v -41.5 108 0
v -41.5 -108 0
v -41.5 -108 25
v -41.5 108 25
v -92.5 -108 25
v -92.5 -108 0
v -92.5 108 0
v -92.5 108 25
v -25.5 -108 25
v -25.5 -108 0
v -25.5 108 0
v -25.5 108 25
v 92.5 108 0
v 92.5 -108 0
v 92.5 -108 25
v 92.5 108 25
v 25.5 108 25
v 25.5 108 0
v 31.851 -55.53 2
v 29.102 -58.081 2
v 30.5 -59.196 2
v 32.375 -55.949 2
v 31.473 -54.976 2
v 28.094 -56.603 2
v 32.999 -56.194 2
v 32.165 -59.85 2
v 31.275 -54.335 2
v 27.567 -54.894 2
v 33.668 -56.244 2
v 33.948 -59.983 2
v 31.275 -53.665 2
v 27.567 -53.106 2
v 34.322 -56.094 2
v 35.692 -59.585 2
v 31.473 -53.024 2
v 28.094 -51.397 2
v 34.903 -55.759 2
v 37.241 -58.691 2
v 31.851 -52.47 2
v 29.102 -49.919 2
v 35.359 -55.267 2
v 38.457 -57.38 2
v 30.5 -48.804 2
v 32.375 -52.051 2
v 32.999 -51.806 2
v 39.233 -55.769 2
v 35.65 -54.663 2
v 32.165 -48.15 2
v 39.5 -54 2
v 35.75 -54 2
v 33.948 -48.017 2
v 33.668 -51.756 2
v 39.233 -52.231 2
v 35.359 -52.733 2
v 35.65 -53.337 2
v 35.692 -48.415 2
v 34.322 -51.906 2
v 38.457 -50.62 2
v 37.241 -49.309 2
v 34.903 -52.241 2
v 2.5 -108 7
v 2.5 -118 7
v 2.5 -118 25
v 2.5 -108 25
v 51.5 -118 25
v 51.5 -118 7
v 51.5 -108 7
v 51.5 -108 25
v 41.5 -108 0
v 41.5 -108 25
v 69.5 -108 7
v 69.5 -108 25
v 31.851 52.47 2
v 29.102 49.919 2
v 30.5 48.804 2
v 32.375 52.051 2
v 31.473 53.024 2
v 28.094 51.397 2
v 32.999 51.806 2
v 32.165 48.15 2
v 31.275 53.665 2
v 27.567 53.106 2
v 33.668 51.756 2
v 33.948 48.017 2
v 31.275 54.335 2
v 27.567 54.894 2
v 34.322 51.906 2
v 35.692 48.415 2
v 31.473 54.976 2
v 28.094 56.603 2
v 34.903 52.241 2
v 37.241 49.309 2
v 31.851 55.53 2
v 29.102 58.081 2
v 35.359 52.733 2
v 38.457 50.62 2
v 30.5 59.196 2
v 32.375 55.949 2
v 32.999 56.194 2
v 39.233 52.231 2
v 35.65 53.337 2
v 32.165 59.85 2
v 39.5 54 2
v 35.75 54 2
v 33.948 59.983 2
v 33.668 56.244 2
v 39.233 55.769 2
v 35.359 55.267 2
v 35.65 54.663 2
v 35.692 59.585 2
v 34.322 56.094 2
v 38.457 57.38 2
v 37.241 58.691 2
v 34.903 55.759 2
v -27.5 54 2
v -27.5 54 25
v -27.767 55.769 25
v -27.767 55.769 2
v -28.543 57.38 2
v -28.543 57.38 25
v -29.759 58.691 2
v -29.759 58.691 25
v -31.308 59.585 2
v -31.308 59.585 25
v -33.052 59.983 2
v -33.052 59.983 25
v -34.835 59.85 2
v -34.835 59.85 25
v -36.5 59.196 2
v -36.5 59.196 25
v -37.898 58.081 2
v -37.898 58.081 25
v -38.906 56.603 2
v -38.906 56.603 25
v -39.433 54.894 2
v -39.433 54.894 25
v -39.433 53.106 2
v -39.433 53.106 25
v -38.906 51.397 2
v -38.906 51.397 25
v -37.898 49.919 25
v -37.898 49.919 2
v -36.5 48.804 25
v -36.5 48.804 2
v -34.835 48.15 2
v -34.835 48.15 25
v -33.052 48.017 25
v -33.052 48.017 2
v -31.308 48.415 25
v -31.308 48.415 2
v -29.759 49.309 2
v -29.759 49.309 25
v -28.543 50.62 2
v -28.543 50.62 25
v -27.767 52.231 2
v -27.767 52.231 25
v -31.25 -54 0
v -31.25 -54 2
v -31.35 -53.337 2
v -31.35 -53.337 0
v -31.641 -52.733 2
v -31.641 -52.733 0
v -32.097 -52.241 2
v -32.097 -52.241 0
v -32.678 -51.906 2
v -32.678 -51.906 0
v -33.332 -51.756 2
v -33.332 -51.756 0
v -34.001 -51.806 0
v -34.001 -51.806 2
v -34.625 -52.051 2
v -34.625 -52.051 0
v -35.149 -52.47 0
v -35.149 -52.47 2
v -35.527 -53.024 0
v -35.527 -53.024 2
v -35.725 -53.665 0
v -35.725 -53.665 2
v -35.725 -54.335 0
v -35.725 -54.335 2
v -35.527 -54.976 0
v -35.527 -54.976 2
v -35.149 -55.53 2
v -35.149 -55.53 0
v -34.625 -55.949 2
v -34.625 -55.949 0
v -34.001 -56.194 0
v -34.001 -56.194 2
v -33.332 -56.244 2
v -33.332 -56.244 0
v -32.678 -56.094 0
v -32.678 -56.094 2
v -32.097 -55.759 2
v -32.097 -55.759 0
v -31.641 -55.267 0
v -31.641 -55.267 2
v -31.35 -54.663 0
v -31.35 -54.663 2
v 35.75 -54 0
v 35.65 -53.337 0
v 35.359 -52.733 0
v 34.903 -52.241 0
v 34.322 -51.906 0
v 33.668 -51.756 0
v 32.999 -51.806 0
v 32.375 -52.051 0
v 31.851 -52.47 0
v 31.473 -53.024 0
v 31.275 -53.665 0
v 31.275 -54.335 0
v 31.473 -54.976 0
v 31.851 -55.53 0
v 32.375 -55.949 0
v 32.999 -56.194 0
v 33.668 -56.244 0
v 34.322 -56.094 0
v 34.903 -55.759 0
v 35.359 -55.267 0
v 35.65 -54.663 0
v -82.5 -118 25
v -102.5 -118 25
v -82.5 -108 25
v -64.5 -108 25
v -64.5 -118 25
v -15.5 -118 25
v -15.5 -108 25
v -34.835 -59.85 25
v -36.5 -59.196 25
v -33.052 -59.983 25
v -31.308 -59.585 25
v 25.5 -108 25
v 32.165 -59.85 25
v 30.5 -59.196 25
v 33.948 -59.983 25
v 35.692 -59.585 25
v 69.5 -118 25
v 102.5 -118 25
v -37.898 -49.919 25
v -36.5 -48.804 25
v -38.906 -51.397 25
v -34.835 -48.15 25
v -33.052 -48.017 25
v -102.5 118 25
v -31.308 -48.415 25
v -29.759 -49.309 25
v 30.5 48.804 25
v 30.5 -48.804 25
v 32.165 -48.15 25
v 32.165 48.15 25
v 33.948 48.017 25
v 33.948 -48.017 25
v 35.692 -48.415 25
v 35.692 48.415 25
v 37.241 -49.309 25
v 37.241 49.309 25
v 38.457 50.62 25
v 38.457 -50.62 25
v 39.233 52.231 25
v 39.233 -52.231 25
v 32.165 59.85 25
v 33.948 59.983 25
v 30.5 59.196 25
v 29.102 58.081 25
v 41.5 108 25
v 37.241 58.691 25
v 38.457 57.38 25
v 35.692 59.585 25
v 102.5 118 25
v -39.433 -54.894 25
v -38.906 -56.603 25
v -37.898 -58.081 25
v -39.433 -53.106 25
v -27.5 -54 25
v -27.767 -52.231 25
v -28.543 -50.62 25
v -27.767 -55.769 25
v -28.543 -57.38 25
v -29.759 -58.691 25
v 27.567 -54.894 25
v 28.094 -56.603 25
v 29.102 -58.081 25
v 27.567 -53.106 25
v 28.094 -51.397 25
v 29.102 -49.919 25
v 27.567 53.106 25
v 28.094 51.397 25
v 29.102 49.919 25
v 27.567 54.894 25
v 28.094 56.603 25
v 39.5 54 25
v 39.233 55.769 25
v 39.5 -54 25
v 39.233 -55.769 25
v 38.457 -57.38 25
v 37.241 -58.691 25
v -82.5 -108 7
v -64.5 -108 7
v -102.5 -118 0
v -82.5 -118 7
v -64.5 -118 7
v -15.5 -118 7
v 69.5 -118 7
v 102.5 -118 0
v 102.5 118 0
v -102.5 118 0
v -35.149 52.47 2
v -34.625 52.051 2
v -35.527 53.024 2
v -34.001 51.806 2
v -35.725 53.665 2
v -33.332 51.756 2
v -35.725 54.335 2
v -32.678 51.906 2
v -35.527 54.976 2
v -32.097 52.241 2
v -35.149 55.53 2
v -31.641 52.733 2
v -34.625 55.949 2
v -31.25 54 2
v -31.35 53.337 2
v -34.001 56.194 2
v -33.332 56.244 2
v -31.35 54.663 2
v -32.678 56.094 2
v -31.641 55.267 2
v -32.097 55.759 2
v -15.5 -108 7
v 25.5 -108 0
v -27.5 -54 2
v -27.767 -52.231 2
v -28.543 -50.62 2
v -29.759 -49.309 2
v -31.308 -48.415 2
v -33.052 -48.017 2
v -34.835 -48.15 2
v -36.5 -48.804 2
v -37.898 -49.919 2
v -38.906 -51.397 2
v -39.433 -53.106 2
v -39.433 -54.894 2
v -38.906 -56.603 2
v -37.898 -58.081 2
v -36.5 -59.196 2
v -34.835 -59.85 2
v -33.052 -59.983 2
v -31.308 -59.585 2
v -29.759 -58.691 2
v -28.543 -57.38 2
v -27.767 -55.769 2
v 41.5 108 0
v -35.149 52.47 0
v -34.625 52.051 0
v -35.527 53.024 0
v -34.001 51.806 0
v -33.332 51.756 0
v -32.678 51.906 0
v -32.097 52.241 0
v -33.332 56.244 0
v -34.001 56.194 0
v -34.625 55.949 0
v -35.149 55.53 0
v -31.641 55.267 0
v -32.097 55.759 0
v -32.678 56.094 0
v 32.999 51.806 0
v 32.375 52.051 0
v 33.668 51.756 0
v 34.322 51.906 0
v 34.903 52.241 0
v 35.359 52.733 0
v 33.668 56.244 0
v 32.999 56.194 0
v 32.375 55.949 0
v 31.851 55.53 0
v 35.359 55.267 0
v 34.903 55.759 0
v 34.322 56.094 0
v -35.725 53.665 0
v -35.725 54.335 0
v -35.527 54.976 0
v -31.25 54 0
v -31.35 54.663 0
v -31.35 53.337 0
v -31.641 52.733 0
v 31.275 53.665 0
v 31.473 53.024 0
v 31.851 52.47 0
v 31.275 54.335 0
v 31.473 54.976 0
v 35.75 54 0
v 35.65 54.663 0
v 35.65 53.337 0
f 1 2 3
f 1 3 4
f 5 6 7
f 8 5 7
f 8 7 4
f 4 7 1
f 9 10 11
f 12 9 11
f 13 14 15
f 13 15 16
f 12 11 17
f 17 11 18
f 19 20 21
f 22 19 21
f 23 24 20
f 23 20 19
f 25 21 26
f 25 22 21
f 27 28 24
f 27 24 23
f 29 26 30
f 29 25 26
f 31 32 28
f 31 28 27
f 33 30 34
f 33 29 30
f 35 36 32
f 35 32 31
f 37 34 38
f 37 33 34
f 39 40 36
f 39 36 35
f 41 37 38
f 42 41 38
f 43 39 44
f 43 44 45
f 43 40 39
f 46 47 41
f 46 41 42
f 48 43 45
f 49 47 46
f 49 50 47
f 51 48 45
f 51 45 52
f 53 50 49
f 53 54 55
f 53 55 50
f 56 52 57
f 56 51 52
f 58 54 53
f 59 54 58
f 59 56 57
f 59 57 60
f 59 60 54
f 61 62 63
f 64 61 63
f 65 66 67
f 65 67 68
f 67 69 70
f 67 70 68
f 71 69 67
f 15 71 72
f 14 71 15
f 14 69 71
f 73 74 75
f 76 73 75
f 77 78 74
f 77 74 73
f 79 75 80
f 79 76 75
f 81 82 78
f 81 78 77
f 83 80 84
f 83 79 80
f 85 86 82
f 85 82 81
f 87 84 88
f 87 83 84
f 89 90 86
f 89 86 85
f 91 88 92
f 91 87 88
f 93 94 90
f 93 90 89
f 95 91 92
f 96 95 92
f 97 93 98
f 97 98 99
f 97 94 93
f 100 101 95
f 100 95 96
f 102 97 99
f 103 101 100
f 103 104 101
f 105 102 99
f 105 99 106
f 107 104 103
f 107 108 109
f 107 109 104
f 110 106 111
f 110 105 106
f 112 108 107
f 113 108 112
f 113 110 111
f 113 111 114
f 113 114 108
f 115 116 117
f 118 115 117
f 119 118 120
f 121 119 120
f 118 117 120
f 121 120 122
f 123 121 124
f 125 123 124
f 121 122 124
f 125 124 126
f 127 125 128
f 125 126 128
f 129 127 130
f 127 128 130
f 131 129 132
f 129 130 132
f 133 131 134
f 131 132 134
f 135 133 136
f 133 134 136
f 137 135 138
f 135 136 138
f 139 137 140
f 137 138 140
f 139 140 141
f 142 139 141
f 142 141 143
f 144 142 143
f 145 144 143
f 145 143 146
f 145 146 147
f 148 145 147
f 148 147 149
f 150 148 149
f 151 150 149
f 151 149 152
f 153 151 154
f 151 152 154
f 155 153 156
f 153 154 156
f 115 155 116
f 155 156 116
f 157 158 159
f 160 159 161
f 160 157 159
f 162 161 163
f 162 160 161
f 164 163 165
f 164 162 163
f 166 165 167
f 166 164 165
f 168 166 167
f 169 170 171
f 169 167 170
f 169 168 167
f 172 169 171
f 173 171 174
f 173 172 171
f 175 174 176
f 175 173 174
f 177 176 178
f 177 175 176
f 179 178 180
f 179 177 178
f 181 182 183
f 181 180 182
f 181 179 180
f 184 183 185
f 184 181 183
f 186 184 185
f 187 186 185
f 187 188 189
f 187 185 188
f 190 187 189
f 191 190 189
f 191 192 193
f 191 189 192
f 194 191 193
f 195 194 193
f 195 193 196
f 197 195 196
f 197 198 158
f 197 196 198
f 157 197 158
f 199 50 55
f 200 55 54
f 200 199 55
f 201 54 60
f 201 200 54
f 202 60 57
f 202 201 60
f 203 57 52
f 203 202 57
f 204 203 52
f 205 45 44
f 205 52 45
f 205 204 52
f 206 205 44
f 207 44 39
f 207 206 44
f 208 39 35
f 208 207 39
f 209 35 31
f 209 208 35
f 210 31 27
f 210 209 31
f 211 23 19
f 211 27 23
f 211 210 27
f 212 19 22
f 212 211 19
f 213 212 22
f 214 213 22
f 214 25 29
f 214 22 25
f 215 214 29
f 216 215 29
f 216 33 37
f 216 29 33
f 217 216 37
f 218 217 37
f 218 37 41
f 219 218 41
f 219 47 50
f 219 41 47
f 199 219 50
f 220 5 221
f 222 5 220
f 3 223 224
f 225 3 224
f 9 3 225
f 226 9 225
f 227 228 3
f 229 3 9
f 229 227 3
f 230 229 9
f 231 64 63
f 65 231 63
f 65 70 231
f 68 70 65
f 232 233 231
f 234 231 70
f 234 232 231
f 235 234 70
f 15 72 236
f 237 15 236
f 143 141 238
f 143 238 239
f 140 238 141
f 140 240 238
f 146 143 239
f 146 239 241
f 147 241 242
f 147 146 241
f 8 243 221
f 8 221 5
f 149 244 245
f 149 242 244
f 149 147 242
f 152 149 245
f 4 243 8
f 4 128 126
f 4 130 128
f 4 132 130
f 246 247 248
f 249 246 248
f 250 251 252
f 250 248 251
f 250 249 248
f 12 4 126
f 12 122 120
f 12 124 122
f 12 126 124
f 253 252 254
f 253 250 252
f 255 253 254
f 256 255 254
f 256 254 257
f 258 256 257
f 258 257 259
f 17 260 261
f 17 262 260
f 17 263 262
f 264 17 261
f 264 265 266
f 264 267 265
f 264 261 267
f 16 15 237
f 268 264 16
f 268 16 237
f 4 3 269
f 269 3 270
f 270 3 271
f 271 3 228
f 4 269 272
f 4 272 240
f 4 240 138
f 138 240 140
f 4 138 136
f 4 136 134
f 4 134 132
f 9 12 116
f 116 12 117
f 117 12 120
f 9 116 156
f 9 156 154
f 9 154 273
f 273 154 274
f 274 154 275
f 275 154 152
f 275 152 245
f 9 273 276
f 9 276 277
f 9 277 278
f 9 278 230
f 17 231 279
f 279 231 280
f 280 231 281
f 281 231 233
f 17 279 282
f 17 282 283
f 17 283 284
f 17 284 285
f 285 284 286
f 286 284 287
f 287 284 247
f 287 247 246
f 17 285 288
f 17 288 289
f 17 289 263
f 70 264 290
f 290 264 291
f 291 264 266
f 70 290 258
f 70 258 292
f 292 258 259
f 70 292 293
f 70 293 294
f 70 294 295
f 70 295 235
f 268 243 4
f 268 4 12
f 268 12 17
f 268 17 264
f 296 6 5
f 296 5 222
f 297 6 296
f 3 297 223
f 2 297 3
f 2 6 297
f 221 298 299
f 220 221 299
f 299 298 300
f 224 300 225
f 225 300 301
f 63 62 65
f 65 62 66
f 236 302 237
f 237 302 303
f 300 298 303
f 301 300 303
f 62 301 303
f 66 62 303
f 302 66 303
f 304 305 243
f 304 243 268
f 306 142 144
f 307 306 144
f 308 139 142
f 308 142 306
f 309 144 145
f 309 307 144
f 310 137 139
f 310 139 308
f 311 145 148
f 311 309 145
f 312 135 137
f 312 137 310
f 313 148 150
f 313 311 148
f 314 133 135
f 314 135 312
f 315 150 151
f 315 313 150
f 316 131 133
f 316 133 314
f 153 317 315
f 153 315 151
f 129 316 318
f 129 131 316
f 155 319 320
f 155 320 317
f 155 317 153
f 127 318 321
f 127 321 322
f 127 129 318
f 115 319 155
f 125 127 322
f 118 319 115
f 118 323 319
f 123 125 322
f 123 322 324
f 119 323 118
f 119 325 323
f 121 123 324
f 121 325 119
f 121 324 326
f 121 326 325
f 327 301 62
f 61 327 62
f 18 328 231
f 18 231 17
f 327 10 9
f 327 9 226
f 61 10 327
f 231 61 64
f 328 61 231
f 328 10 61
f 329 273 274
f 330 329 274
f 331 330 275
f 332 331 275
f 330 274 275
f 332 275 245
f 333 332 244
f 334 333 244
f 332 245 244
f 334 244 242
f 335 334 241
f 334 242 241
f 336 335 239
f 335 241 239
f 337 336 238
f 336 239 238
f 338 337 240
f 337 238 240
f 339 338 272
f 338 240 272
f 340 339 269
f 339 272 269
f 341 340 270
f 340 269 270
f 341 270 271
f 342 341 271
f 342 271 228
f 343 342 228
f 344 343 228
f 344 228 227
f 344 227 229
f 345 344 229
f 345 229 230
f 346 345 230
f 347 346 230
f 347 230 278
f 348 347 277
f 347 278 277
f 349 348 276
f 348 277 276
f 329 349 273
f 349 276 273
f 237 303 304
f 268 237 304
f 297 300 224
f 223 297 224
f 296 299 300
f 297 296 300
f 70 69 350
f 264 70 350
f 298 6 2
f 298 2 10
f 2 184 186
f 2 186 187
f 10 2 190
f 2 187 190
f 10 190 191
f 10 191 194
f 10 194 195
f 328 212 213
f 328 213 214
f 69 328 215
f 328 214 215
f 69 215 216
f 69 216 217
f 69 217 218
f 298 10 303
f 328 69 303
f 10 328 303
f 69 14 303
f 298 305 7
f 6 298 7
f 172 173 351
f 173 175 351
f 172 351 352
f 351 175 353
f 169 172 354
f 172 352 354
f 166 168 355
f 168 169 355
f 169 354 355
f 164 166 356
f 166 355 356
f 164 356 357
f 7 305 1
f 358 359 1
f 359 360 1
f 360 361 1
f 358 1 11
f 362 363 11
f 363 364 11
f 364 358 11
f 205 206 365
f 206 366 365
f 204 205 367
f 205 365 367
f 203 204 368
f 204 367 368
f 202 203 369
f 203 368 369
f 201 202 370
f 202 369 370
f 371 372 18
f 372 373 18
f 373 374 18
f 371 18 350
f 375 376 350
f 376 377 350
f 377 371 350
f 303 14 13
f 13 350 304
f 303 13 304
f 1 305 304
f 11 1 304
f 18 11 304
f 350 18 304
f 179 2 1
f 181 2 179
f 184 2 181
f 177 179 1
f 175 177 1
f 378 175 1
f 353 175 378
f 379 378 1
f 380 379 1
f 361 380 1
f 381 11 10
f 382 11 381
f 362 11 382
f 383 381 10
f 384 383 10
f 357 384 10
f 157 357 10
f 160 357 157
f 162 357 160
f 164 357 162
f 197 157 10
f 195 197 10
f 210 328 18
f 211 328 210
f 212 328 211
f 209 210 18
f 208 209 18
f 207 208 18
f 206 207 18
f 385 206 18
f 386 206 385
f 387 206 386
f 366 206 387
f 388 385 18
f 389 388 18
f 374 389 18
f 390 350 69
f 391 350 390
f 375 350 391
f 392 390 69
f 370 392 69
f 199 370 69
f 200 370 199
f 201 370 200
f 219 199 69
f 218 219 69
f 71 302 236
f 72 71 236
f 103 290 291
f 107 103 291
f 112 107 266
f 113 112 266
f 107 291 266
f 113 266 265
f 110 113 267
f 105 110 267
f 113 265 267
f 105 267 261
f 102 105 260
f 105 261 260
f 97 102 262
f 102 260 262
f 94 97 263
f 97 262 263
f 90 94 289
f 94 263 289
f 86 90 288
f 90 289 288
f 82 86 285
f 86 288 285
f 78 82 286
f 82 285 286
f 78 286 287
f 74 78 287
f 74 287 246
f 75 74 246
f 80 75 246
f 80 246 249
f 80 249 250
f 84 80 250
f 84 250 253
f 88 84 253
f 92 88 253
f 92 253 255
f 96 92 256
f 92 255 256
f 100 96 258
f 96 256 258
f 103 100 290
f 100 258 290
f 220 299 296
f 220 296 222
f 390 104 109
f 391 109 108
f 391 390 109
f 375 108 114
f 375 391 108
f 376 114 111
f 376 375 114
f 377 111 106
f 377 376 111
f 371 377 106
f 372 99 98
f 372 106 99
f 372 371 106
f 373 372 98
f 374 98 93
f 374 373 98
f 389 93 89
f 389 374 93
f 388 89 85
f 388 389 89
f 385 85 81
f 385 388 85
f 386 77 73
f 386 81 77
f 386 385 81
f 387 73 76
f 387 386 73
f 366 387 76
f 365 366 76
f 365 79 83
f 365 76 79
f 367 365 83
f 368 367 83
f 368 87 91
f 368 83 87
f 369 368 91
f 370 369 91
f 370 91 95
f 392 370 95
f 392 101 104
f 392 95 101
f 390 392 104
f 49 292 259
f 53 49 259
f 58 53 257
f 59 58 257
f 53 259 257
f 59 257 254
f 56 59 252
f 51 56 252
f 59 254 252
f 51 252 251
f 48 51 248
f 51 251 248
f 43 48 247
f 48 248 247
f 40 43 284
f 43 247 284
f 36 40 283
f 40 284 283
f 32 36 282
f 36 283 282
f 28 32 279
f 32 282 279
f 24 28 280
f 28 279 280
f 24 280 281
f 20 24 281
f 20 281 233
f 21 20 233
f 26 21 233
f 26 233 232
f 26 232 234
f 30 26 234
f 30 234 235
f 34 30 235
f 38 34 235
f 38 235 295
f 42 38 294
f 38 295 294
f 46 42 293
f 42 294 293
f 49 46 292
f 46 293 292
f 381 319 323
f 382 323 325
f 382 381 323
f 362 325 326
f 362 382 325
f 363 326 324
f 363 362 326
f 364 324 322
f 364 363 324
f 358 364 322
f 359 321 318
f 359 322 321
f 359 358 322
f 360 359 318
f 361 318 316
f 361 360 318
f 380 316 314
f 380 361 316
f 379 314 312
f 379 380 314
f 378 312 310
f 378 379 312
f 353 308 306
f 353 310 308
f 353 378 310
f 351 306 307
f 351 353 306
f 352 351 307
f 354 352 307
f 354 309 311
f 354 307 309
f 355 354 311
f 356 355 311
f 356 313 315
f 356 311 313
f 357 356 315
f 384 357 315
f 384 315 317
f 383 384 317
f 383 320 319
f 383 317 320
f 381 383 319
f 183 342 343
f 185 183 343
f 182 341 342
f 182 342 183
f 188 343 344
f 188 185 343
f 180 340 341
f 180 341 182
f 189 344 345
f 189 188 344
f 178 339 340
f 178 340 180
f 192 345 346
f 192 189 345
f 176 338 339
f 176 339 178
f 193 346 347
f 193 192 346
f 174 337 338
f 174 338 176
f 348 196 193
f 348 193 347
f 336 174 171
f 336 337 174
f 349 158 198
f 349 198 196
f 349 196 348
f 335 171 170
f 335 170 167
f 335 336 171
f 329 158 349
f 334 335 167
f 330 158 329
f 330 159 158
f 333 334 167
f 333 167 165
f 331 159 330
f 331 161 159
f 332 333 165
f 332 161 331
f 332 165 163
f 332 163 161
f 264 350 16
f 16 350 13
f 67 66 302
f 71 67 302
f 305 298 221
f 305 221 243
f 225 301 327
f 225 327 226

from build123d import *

# Parameters (mm, degrees)
F0_W     = 205
F0_H     = 236
F0_R     = 2.25
F0_W_2   = 51
F0_H_2   = 216
F1_DEPTH = 25
F2_W     = 18
F2_H     = 18
F3_DEPTH = 10
F4_R     = 6
F5_DEPTH = 23


with BuildPart() as f1:
    # F0 (on Top) → F1 (new body)
    with BuildSketch(Plane.XY):
        Rectangle(F0_W, F0_H)
        with Locations((-33.5, -54)):
            Circle(F0_R, mode=Mode.SUBTRACT)
        with Locations((33.5, -54)):
            Circle(F0_R, mode=Mode.SUBTRACT)
        with Locations((-67, 0)):
            Rectangle(F0_W_2, F0_H_2, mode=Mode.SUBTRACT)
        with Locations((-33.5, 54)):
            Circle(F0_R, mode=Mode.SUBTRACT)
        Rectangle(F0_W_2, F0_H_2, mode=Mode.SUBTRACT)
        with Locations((33.5, 54)):
            Circle(F0_R, mode=Mode.SUBTRACT)
        with Locations((67, 0)):
            Rectangle(F0_W_2, F0_H_2, mode=Mode.SUBTRACT)
    extrude(amount=F1_DEPTH)

    # F2 (on face) → F3 (cut, through all)
    with BuildSketch(Plane.XZ.offset(118)):
        with Locations((-73.5, 16)):
            Rectangle(F2_W, F2_H)
        with Locations((-6.5, 16)):
            Rectangle(F2_W, F2_H)
        with Locations((60.5, 16)):
            Rectangle(F2_W, F2_H)
    extrude(amount=-F3_DEPTH, mode=Mode.SUBTRACT)

    # F4 (on face) → F5 (cut)
    with BuildSketch(Plane.XY.offset(25)):
        with Locations((-33.5, 54)):
            Circle(F4_R)
        with Locations((-33.5, -54)):
            Circle(F4_R)
        with Locations((33.5, 54)):
            Circle(F4_R)
        with Locations((33.5, -54)):
            Circle(F4_R)
    extrude(amount=-F5_DEPTH, mode=Mode.SUBTRACT)


solid = f1.part
